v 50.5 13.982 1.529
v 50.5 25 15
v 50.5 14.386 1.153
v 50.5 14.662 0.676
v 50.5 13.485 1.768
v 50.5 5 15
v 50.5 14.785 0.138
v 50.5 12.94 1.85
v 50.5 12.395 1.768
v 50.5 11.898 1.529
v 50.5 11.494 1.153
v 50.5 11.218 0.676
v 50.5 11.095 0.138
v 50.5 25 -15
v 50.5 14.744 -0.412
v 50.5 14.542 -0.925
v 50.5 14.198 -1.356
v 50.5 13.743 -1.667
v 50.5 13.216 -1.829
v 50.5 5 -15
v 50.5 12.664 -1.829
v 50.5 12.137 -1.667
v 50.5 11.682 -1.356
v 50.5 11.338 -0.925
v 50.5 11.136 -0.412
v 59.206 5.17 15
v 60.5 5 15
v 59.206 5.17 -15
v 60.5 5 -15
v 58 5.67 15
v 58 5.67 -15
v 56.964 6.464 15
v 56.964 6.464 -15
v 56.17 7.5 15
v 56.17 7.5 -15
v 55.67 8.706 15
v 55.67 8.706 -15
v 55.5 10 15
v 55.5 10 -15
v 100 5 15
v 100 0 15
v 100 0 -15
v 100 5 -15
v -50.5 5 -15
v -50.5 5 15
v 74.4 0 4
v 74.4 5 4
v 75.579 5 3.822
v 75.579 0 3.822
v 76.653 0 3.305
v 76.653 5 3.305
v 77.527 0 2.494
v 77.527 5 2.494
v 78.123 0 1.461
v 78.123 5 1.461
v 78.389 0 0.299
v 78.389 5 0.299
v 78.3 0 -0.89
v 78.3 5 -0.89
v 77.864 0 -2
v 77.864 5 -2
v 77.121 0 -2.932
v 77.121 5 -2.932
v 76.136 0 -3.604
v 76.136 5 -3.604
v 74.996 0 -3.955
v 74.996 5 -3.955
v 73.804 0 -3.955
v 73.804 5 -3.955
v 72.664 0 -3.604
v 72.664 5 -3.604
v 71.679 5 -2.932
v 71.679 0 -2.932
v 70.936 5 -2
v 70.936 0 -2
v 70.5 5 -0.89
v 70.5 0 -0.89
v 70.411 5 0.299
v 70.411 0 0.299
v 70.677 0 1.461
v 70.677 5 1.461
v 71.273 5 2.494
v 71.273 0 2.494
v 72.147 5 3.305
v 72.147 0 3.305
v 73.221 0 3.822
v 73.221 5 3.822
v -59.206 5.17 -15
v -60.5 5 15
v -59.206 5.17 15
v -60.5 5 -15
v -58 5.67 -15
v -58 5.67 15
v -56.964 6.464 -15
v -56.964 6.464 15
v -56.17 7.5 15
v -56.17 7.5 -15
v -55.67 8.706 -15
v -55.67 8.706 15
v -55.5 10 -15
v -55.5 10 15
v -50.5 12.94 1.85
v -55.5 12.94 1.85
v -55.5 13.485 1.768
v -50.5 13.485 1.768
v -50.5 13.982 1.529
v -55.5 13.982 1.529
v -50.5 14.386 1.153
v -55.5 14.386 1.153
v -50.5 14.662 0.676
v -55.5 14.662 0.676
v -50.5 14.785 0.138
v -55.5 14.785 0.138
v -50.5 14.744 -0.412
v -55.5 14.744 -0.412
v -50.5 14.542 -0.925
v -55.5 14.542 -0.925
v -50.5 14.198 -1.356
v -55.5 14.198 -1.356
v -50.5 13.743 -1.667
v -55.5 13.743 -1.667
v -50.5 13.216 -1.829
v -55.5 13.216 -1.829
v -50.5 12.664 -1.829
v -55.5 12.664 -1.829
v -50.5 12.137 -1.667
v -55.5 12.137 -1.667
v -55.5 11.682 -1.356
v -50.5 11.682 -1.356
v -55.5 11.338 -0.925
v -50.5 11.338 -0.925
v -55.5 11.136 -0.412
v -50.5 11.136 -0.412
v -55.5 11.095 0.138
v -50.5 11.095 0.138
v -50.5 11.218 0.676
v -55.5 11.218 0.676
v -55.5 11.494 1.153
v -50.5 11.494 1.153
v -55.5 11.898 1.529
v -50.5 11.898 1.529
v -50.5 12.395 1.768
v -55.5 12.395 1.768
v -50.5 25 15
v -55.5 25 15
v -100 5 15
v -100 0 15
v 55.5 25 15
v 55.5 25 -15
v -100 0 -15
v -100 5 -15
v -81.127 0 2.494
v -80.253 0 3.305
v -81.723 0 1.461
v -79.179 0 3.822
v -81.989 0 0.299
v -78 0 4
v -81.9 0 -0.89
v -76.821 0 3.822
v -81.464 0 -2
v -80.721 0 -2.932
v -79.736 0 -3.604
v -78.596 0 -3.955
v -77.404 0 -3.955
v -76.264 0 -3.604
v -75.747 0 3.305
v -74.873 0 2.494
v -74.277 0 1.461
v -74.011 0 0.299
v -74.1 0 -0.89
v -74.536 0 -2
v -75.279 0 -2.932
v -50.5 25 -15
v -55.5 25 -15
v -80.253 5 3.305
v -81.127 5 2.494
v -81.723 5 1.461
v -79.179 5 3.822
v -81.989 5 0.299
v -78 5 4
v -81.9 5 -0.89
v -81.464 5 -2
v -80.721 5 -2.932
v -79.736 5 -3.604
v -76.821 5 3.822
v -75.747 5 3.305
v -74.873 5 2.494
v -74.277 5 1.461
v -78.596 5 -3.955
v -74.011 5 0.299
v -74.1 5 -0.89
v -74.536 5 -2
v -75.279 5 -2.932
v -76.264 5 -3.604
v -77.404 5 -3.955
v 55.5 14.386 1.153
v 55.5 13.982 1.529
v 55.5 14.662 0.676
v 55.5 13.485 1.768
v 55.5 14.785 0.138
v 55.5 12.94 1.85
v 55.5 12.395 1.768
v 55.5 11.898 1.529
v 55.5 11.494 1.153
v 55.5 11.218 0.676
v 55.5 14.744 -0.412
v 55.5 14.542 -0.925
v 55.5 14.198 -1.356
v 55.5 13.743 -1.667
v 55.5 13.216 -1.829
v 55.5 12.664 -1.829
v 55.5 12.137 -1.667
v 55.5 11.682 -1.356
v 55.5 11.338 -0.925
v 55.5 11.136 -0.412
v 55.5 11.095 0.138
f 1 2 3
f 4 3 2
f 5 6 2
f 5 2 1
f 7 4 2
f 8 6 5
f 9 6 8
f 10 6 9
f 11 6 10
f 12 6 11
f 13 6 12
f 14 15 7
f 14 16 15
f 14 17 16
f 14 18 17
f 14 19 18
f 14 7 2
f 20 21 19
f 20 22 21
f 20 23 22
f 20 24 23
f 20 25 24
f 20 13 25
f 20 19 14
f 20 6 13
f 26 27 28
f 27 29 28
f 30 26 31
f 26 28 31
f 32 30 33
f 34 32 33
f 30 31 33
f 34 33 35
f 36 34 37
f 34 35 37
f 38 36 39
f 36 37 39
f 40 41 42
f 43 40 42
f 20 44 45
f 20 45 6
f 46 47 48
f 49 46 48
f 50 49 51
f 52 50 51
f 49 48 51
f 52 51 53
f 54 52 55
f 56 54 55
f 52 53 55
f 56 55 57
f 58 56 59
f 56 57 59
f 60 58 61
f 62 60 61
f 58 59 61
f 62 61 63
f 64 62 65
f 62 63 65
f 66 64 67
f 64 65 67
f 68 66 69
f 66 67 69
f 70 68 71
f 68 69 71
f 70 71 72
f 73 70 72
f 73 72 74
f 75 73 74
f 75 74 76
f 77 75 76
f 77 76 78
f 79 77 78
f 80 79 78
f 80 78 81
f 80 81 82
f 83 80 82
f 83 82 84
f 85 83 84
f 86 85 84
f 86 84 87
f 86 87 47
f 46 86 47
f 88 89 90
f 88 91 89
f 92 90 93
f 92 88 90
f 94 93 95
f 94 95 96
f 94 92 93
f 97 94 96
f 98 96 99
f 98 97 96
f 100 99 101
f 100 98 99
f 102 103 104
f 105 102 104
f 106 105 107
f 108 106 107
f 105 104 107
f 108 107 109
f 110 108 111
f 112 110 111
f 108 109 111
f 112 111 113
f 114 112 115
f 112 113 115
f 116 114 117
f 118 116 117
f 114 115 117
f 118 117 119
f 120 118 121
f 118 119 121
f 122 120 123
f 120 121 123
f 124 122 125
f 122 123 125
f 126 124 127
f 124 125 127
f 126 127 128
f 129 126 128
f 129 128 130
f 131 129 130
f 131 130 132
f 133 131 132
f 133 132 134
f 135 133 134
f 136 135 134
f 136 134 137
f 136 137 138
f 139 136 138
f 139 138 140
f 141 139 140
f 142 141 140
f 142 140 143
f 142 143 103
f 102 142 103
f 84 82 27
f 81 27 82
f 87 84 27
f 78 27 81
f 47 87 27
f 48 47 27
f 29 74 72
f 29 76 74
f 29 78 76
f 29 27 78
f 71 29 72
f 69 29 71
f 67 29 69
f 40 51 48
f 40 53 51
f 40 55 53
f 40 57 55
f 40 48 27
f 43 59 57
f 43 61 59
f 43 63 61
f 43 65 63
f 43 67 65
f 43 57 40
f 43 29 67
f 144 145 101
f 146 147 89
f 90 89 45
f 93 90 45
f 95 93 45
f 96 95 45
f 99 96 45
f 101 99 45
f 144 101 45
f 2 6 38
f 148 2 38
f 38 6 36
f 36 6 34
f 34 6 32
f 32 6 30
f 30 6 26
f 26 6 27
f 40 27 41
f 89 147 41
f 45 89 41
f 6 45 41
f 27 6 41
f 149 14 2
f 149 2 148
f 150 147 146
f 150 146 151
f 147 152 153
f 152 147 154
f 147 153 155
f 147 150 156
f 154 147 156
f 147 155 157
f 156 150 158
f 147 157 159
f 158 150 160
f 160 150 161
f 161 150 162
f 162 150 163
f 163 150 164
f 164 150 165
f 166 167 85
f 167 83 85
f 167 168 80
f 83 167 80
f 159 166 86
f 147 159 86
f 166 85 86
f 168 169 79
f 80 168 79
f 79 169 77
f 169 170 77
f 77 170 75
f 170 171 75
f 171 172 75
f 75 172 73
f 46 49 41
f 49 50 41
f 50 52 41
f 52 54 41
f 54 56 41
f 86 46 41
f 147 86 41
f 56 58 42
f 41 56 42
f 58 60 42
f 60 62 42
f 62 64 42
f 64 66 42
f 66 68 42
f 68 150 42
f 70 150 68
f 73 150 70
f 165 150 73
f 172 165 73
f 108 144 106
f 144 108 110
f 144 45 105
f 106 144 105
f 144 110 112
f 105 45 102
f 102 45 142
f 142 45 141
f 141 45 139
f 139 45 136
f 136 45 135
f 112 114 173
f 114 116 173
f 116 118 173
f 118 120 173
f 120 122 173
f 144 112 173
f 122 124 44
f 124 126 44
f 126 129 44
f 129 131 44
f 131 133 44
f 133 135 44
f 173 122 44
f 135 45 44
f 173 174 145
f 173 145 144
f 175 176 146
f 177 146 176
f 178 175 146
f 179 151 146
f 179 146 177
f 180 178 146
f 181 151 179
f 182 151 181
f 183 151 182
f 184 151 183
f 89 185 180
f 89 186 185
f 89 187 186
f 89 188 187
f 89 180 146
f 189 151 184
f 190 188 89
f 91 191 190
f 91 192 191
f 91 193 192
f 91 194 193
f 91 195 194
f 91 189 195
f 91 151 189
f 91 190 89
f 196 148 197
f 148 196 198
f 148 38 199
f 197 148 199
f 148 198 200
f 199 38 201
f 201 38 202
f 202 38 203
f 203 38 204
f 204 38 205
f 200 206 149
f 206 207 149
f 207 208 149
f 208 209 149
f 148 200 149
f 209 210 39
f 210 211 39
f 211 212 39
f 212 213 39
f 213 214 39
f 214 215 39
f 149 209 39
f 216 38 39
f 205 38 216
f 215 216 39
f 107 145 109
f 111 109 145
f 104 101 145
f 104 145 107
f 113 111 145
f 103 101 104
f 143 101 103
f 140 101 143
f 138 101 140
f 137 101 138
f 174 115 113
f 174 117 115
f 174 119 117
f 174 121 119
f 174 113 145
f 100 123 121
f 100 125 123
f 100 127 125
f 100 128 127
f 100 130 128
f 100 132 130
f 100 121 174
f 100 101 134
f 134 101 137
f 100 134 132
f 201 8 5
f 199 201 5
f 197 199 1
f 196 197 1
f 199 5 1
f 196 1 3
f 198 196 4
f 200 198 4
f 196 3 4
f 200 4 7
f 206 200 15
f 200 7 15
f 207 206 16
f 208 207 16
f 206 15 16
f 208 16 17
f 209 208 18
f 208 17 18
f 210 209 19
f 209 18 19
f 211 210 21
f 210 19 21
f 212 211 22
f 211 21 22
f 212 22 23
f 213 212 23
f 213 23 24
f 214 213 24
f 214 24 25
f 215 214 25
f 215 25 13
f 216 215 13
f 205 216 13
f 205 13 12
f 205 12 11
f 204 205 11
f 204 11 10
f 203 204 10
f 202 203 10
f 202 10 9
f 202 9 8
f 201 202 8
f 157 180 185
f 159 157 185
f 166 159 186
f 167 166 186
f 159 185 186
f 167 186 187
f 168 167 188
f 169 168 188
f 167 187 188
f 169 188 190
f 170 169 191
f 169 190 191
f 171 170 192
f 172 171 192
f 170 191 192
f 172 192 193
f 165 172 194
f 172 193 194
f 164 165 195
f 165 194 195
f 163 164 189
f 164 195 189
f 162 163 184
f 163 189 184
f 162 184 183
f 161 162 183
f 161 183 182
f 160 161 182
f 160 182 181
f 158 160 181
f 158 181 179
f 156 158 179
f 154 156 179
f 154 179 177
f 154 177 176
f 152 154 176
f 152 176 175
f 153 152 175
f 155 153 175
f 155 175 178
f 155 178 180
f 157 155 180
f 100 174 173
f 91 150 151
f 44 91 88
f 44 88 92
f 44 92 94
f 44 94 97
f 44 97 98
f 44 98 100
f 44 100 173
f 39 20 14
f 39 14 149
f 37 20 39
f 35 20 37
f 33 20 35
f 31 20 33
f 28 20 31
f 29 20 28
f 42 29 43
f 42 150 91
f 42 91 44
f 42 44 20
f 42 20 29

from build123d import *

# Parameters (mm, degrees)
SKETCH1_W           = 200
SKETCH1_H           = 30
BOSS_EXTRUDE1_DEPTH = 5
SKETCH2_W           = 5
SKETCH2_H           = 30
BOSS_EXTRUDE2_DEPTH = 20
FILLET1_R           = 5
SKETCH3_R           = 1.85
CUT_EXTRUDE2_DEPTH  = 159.209512988
SKETCH4_R           = 4
CUT_EXTRUDE3_DEPTH  = 104.07764064
SKETCH5_R           = 4
CUT_EXTRUDE4_DEPTH  = 104.07764064


with BuildPart() as part:
    # Sketch1 → Boss-Extrude1 (new body)
    with BuildSketch(Plane(origin=(0, 0, 0), x_dir=(1, 0, 0), z_dir=(0, 1, 0))):
        Rectangle(SKETCH1_W, SKETCH1_H)
    extrude(amount=BOSS_EXTRUDE1_DEPTH)

    # Sketch2 → Boss-Extrude2 (add)
    with BuildSketch(Plane(origin=(0, 5, 0), x_dir=(1, 0, 0), z_dir=(0, 1, 0))):
        with Locations((-53, 0)):
            Rectangle(SKETCH2_W, SKETCH2_H)
        with Locations((53, 0)):
            Rectangle(SKETCH2_W, SKETCH2_H)
    extrude(amount=BOSS_EXTRUDE2_DEPTH)

    # Fillet1
    fillet1_edges = [part.edges().sort_by_distance(p)[0] for p in [
        (-55.5, 5, 0),
        (55.5, 5, 0),
    ]]
    fillet(fillet1_edges, radius=FILLET1_R)

    # Sketch3 → Cut-Extrude2 (cut, through all)
    with BuildSketch(Plane.ZY.offset(55.5)):
        with Locations((0, 12.94)):
            Circle(SKETCH3_R)
    extrude(amount=-CUT_EXTRUDE2_DEPTH, mode=Mode.SUBTRACT)

    # Sketch4 → Cut-Extrude3 (cut, through all)
    with BuildSketch(Plane(origin=(0, 5, 0), x_dir=(1, 0, 0), z_dir=(0, 1, 0))):
        with Locations(Location((-78, 0, 0), (0, 0, 270))):
            Circle(SKETCH4_R)
    extrude(amount=-CUT_EXTRUDE3_DEPTH, mode=Mode.SUBTRACT)

    # Sketch5 → Cut-Extrude4 (cut, through all)
    with BuildSketch(Plane(origin=(0, 5, 0), x_dir=(1, 0, 0), z_dir=(0, 1, 0))):
        with Locations(Location((74.4, 0, 0), (0, 0, 270))):
            Circle(SKETCH5_R)
    extrude(amount=-CUT_EXTRUDE4_DEPTH, mode=Mode.SUBTRACT)


solid = part.part
